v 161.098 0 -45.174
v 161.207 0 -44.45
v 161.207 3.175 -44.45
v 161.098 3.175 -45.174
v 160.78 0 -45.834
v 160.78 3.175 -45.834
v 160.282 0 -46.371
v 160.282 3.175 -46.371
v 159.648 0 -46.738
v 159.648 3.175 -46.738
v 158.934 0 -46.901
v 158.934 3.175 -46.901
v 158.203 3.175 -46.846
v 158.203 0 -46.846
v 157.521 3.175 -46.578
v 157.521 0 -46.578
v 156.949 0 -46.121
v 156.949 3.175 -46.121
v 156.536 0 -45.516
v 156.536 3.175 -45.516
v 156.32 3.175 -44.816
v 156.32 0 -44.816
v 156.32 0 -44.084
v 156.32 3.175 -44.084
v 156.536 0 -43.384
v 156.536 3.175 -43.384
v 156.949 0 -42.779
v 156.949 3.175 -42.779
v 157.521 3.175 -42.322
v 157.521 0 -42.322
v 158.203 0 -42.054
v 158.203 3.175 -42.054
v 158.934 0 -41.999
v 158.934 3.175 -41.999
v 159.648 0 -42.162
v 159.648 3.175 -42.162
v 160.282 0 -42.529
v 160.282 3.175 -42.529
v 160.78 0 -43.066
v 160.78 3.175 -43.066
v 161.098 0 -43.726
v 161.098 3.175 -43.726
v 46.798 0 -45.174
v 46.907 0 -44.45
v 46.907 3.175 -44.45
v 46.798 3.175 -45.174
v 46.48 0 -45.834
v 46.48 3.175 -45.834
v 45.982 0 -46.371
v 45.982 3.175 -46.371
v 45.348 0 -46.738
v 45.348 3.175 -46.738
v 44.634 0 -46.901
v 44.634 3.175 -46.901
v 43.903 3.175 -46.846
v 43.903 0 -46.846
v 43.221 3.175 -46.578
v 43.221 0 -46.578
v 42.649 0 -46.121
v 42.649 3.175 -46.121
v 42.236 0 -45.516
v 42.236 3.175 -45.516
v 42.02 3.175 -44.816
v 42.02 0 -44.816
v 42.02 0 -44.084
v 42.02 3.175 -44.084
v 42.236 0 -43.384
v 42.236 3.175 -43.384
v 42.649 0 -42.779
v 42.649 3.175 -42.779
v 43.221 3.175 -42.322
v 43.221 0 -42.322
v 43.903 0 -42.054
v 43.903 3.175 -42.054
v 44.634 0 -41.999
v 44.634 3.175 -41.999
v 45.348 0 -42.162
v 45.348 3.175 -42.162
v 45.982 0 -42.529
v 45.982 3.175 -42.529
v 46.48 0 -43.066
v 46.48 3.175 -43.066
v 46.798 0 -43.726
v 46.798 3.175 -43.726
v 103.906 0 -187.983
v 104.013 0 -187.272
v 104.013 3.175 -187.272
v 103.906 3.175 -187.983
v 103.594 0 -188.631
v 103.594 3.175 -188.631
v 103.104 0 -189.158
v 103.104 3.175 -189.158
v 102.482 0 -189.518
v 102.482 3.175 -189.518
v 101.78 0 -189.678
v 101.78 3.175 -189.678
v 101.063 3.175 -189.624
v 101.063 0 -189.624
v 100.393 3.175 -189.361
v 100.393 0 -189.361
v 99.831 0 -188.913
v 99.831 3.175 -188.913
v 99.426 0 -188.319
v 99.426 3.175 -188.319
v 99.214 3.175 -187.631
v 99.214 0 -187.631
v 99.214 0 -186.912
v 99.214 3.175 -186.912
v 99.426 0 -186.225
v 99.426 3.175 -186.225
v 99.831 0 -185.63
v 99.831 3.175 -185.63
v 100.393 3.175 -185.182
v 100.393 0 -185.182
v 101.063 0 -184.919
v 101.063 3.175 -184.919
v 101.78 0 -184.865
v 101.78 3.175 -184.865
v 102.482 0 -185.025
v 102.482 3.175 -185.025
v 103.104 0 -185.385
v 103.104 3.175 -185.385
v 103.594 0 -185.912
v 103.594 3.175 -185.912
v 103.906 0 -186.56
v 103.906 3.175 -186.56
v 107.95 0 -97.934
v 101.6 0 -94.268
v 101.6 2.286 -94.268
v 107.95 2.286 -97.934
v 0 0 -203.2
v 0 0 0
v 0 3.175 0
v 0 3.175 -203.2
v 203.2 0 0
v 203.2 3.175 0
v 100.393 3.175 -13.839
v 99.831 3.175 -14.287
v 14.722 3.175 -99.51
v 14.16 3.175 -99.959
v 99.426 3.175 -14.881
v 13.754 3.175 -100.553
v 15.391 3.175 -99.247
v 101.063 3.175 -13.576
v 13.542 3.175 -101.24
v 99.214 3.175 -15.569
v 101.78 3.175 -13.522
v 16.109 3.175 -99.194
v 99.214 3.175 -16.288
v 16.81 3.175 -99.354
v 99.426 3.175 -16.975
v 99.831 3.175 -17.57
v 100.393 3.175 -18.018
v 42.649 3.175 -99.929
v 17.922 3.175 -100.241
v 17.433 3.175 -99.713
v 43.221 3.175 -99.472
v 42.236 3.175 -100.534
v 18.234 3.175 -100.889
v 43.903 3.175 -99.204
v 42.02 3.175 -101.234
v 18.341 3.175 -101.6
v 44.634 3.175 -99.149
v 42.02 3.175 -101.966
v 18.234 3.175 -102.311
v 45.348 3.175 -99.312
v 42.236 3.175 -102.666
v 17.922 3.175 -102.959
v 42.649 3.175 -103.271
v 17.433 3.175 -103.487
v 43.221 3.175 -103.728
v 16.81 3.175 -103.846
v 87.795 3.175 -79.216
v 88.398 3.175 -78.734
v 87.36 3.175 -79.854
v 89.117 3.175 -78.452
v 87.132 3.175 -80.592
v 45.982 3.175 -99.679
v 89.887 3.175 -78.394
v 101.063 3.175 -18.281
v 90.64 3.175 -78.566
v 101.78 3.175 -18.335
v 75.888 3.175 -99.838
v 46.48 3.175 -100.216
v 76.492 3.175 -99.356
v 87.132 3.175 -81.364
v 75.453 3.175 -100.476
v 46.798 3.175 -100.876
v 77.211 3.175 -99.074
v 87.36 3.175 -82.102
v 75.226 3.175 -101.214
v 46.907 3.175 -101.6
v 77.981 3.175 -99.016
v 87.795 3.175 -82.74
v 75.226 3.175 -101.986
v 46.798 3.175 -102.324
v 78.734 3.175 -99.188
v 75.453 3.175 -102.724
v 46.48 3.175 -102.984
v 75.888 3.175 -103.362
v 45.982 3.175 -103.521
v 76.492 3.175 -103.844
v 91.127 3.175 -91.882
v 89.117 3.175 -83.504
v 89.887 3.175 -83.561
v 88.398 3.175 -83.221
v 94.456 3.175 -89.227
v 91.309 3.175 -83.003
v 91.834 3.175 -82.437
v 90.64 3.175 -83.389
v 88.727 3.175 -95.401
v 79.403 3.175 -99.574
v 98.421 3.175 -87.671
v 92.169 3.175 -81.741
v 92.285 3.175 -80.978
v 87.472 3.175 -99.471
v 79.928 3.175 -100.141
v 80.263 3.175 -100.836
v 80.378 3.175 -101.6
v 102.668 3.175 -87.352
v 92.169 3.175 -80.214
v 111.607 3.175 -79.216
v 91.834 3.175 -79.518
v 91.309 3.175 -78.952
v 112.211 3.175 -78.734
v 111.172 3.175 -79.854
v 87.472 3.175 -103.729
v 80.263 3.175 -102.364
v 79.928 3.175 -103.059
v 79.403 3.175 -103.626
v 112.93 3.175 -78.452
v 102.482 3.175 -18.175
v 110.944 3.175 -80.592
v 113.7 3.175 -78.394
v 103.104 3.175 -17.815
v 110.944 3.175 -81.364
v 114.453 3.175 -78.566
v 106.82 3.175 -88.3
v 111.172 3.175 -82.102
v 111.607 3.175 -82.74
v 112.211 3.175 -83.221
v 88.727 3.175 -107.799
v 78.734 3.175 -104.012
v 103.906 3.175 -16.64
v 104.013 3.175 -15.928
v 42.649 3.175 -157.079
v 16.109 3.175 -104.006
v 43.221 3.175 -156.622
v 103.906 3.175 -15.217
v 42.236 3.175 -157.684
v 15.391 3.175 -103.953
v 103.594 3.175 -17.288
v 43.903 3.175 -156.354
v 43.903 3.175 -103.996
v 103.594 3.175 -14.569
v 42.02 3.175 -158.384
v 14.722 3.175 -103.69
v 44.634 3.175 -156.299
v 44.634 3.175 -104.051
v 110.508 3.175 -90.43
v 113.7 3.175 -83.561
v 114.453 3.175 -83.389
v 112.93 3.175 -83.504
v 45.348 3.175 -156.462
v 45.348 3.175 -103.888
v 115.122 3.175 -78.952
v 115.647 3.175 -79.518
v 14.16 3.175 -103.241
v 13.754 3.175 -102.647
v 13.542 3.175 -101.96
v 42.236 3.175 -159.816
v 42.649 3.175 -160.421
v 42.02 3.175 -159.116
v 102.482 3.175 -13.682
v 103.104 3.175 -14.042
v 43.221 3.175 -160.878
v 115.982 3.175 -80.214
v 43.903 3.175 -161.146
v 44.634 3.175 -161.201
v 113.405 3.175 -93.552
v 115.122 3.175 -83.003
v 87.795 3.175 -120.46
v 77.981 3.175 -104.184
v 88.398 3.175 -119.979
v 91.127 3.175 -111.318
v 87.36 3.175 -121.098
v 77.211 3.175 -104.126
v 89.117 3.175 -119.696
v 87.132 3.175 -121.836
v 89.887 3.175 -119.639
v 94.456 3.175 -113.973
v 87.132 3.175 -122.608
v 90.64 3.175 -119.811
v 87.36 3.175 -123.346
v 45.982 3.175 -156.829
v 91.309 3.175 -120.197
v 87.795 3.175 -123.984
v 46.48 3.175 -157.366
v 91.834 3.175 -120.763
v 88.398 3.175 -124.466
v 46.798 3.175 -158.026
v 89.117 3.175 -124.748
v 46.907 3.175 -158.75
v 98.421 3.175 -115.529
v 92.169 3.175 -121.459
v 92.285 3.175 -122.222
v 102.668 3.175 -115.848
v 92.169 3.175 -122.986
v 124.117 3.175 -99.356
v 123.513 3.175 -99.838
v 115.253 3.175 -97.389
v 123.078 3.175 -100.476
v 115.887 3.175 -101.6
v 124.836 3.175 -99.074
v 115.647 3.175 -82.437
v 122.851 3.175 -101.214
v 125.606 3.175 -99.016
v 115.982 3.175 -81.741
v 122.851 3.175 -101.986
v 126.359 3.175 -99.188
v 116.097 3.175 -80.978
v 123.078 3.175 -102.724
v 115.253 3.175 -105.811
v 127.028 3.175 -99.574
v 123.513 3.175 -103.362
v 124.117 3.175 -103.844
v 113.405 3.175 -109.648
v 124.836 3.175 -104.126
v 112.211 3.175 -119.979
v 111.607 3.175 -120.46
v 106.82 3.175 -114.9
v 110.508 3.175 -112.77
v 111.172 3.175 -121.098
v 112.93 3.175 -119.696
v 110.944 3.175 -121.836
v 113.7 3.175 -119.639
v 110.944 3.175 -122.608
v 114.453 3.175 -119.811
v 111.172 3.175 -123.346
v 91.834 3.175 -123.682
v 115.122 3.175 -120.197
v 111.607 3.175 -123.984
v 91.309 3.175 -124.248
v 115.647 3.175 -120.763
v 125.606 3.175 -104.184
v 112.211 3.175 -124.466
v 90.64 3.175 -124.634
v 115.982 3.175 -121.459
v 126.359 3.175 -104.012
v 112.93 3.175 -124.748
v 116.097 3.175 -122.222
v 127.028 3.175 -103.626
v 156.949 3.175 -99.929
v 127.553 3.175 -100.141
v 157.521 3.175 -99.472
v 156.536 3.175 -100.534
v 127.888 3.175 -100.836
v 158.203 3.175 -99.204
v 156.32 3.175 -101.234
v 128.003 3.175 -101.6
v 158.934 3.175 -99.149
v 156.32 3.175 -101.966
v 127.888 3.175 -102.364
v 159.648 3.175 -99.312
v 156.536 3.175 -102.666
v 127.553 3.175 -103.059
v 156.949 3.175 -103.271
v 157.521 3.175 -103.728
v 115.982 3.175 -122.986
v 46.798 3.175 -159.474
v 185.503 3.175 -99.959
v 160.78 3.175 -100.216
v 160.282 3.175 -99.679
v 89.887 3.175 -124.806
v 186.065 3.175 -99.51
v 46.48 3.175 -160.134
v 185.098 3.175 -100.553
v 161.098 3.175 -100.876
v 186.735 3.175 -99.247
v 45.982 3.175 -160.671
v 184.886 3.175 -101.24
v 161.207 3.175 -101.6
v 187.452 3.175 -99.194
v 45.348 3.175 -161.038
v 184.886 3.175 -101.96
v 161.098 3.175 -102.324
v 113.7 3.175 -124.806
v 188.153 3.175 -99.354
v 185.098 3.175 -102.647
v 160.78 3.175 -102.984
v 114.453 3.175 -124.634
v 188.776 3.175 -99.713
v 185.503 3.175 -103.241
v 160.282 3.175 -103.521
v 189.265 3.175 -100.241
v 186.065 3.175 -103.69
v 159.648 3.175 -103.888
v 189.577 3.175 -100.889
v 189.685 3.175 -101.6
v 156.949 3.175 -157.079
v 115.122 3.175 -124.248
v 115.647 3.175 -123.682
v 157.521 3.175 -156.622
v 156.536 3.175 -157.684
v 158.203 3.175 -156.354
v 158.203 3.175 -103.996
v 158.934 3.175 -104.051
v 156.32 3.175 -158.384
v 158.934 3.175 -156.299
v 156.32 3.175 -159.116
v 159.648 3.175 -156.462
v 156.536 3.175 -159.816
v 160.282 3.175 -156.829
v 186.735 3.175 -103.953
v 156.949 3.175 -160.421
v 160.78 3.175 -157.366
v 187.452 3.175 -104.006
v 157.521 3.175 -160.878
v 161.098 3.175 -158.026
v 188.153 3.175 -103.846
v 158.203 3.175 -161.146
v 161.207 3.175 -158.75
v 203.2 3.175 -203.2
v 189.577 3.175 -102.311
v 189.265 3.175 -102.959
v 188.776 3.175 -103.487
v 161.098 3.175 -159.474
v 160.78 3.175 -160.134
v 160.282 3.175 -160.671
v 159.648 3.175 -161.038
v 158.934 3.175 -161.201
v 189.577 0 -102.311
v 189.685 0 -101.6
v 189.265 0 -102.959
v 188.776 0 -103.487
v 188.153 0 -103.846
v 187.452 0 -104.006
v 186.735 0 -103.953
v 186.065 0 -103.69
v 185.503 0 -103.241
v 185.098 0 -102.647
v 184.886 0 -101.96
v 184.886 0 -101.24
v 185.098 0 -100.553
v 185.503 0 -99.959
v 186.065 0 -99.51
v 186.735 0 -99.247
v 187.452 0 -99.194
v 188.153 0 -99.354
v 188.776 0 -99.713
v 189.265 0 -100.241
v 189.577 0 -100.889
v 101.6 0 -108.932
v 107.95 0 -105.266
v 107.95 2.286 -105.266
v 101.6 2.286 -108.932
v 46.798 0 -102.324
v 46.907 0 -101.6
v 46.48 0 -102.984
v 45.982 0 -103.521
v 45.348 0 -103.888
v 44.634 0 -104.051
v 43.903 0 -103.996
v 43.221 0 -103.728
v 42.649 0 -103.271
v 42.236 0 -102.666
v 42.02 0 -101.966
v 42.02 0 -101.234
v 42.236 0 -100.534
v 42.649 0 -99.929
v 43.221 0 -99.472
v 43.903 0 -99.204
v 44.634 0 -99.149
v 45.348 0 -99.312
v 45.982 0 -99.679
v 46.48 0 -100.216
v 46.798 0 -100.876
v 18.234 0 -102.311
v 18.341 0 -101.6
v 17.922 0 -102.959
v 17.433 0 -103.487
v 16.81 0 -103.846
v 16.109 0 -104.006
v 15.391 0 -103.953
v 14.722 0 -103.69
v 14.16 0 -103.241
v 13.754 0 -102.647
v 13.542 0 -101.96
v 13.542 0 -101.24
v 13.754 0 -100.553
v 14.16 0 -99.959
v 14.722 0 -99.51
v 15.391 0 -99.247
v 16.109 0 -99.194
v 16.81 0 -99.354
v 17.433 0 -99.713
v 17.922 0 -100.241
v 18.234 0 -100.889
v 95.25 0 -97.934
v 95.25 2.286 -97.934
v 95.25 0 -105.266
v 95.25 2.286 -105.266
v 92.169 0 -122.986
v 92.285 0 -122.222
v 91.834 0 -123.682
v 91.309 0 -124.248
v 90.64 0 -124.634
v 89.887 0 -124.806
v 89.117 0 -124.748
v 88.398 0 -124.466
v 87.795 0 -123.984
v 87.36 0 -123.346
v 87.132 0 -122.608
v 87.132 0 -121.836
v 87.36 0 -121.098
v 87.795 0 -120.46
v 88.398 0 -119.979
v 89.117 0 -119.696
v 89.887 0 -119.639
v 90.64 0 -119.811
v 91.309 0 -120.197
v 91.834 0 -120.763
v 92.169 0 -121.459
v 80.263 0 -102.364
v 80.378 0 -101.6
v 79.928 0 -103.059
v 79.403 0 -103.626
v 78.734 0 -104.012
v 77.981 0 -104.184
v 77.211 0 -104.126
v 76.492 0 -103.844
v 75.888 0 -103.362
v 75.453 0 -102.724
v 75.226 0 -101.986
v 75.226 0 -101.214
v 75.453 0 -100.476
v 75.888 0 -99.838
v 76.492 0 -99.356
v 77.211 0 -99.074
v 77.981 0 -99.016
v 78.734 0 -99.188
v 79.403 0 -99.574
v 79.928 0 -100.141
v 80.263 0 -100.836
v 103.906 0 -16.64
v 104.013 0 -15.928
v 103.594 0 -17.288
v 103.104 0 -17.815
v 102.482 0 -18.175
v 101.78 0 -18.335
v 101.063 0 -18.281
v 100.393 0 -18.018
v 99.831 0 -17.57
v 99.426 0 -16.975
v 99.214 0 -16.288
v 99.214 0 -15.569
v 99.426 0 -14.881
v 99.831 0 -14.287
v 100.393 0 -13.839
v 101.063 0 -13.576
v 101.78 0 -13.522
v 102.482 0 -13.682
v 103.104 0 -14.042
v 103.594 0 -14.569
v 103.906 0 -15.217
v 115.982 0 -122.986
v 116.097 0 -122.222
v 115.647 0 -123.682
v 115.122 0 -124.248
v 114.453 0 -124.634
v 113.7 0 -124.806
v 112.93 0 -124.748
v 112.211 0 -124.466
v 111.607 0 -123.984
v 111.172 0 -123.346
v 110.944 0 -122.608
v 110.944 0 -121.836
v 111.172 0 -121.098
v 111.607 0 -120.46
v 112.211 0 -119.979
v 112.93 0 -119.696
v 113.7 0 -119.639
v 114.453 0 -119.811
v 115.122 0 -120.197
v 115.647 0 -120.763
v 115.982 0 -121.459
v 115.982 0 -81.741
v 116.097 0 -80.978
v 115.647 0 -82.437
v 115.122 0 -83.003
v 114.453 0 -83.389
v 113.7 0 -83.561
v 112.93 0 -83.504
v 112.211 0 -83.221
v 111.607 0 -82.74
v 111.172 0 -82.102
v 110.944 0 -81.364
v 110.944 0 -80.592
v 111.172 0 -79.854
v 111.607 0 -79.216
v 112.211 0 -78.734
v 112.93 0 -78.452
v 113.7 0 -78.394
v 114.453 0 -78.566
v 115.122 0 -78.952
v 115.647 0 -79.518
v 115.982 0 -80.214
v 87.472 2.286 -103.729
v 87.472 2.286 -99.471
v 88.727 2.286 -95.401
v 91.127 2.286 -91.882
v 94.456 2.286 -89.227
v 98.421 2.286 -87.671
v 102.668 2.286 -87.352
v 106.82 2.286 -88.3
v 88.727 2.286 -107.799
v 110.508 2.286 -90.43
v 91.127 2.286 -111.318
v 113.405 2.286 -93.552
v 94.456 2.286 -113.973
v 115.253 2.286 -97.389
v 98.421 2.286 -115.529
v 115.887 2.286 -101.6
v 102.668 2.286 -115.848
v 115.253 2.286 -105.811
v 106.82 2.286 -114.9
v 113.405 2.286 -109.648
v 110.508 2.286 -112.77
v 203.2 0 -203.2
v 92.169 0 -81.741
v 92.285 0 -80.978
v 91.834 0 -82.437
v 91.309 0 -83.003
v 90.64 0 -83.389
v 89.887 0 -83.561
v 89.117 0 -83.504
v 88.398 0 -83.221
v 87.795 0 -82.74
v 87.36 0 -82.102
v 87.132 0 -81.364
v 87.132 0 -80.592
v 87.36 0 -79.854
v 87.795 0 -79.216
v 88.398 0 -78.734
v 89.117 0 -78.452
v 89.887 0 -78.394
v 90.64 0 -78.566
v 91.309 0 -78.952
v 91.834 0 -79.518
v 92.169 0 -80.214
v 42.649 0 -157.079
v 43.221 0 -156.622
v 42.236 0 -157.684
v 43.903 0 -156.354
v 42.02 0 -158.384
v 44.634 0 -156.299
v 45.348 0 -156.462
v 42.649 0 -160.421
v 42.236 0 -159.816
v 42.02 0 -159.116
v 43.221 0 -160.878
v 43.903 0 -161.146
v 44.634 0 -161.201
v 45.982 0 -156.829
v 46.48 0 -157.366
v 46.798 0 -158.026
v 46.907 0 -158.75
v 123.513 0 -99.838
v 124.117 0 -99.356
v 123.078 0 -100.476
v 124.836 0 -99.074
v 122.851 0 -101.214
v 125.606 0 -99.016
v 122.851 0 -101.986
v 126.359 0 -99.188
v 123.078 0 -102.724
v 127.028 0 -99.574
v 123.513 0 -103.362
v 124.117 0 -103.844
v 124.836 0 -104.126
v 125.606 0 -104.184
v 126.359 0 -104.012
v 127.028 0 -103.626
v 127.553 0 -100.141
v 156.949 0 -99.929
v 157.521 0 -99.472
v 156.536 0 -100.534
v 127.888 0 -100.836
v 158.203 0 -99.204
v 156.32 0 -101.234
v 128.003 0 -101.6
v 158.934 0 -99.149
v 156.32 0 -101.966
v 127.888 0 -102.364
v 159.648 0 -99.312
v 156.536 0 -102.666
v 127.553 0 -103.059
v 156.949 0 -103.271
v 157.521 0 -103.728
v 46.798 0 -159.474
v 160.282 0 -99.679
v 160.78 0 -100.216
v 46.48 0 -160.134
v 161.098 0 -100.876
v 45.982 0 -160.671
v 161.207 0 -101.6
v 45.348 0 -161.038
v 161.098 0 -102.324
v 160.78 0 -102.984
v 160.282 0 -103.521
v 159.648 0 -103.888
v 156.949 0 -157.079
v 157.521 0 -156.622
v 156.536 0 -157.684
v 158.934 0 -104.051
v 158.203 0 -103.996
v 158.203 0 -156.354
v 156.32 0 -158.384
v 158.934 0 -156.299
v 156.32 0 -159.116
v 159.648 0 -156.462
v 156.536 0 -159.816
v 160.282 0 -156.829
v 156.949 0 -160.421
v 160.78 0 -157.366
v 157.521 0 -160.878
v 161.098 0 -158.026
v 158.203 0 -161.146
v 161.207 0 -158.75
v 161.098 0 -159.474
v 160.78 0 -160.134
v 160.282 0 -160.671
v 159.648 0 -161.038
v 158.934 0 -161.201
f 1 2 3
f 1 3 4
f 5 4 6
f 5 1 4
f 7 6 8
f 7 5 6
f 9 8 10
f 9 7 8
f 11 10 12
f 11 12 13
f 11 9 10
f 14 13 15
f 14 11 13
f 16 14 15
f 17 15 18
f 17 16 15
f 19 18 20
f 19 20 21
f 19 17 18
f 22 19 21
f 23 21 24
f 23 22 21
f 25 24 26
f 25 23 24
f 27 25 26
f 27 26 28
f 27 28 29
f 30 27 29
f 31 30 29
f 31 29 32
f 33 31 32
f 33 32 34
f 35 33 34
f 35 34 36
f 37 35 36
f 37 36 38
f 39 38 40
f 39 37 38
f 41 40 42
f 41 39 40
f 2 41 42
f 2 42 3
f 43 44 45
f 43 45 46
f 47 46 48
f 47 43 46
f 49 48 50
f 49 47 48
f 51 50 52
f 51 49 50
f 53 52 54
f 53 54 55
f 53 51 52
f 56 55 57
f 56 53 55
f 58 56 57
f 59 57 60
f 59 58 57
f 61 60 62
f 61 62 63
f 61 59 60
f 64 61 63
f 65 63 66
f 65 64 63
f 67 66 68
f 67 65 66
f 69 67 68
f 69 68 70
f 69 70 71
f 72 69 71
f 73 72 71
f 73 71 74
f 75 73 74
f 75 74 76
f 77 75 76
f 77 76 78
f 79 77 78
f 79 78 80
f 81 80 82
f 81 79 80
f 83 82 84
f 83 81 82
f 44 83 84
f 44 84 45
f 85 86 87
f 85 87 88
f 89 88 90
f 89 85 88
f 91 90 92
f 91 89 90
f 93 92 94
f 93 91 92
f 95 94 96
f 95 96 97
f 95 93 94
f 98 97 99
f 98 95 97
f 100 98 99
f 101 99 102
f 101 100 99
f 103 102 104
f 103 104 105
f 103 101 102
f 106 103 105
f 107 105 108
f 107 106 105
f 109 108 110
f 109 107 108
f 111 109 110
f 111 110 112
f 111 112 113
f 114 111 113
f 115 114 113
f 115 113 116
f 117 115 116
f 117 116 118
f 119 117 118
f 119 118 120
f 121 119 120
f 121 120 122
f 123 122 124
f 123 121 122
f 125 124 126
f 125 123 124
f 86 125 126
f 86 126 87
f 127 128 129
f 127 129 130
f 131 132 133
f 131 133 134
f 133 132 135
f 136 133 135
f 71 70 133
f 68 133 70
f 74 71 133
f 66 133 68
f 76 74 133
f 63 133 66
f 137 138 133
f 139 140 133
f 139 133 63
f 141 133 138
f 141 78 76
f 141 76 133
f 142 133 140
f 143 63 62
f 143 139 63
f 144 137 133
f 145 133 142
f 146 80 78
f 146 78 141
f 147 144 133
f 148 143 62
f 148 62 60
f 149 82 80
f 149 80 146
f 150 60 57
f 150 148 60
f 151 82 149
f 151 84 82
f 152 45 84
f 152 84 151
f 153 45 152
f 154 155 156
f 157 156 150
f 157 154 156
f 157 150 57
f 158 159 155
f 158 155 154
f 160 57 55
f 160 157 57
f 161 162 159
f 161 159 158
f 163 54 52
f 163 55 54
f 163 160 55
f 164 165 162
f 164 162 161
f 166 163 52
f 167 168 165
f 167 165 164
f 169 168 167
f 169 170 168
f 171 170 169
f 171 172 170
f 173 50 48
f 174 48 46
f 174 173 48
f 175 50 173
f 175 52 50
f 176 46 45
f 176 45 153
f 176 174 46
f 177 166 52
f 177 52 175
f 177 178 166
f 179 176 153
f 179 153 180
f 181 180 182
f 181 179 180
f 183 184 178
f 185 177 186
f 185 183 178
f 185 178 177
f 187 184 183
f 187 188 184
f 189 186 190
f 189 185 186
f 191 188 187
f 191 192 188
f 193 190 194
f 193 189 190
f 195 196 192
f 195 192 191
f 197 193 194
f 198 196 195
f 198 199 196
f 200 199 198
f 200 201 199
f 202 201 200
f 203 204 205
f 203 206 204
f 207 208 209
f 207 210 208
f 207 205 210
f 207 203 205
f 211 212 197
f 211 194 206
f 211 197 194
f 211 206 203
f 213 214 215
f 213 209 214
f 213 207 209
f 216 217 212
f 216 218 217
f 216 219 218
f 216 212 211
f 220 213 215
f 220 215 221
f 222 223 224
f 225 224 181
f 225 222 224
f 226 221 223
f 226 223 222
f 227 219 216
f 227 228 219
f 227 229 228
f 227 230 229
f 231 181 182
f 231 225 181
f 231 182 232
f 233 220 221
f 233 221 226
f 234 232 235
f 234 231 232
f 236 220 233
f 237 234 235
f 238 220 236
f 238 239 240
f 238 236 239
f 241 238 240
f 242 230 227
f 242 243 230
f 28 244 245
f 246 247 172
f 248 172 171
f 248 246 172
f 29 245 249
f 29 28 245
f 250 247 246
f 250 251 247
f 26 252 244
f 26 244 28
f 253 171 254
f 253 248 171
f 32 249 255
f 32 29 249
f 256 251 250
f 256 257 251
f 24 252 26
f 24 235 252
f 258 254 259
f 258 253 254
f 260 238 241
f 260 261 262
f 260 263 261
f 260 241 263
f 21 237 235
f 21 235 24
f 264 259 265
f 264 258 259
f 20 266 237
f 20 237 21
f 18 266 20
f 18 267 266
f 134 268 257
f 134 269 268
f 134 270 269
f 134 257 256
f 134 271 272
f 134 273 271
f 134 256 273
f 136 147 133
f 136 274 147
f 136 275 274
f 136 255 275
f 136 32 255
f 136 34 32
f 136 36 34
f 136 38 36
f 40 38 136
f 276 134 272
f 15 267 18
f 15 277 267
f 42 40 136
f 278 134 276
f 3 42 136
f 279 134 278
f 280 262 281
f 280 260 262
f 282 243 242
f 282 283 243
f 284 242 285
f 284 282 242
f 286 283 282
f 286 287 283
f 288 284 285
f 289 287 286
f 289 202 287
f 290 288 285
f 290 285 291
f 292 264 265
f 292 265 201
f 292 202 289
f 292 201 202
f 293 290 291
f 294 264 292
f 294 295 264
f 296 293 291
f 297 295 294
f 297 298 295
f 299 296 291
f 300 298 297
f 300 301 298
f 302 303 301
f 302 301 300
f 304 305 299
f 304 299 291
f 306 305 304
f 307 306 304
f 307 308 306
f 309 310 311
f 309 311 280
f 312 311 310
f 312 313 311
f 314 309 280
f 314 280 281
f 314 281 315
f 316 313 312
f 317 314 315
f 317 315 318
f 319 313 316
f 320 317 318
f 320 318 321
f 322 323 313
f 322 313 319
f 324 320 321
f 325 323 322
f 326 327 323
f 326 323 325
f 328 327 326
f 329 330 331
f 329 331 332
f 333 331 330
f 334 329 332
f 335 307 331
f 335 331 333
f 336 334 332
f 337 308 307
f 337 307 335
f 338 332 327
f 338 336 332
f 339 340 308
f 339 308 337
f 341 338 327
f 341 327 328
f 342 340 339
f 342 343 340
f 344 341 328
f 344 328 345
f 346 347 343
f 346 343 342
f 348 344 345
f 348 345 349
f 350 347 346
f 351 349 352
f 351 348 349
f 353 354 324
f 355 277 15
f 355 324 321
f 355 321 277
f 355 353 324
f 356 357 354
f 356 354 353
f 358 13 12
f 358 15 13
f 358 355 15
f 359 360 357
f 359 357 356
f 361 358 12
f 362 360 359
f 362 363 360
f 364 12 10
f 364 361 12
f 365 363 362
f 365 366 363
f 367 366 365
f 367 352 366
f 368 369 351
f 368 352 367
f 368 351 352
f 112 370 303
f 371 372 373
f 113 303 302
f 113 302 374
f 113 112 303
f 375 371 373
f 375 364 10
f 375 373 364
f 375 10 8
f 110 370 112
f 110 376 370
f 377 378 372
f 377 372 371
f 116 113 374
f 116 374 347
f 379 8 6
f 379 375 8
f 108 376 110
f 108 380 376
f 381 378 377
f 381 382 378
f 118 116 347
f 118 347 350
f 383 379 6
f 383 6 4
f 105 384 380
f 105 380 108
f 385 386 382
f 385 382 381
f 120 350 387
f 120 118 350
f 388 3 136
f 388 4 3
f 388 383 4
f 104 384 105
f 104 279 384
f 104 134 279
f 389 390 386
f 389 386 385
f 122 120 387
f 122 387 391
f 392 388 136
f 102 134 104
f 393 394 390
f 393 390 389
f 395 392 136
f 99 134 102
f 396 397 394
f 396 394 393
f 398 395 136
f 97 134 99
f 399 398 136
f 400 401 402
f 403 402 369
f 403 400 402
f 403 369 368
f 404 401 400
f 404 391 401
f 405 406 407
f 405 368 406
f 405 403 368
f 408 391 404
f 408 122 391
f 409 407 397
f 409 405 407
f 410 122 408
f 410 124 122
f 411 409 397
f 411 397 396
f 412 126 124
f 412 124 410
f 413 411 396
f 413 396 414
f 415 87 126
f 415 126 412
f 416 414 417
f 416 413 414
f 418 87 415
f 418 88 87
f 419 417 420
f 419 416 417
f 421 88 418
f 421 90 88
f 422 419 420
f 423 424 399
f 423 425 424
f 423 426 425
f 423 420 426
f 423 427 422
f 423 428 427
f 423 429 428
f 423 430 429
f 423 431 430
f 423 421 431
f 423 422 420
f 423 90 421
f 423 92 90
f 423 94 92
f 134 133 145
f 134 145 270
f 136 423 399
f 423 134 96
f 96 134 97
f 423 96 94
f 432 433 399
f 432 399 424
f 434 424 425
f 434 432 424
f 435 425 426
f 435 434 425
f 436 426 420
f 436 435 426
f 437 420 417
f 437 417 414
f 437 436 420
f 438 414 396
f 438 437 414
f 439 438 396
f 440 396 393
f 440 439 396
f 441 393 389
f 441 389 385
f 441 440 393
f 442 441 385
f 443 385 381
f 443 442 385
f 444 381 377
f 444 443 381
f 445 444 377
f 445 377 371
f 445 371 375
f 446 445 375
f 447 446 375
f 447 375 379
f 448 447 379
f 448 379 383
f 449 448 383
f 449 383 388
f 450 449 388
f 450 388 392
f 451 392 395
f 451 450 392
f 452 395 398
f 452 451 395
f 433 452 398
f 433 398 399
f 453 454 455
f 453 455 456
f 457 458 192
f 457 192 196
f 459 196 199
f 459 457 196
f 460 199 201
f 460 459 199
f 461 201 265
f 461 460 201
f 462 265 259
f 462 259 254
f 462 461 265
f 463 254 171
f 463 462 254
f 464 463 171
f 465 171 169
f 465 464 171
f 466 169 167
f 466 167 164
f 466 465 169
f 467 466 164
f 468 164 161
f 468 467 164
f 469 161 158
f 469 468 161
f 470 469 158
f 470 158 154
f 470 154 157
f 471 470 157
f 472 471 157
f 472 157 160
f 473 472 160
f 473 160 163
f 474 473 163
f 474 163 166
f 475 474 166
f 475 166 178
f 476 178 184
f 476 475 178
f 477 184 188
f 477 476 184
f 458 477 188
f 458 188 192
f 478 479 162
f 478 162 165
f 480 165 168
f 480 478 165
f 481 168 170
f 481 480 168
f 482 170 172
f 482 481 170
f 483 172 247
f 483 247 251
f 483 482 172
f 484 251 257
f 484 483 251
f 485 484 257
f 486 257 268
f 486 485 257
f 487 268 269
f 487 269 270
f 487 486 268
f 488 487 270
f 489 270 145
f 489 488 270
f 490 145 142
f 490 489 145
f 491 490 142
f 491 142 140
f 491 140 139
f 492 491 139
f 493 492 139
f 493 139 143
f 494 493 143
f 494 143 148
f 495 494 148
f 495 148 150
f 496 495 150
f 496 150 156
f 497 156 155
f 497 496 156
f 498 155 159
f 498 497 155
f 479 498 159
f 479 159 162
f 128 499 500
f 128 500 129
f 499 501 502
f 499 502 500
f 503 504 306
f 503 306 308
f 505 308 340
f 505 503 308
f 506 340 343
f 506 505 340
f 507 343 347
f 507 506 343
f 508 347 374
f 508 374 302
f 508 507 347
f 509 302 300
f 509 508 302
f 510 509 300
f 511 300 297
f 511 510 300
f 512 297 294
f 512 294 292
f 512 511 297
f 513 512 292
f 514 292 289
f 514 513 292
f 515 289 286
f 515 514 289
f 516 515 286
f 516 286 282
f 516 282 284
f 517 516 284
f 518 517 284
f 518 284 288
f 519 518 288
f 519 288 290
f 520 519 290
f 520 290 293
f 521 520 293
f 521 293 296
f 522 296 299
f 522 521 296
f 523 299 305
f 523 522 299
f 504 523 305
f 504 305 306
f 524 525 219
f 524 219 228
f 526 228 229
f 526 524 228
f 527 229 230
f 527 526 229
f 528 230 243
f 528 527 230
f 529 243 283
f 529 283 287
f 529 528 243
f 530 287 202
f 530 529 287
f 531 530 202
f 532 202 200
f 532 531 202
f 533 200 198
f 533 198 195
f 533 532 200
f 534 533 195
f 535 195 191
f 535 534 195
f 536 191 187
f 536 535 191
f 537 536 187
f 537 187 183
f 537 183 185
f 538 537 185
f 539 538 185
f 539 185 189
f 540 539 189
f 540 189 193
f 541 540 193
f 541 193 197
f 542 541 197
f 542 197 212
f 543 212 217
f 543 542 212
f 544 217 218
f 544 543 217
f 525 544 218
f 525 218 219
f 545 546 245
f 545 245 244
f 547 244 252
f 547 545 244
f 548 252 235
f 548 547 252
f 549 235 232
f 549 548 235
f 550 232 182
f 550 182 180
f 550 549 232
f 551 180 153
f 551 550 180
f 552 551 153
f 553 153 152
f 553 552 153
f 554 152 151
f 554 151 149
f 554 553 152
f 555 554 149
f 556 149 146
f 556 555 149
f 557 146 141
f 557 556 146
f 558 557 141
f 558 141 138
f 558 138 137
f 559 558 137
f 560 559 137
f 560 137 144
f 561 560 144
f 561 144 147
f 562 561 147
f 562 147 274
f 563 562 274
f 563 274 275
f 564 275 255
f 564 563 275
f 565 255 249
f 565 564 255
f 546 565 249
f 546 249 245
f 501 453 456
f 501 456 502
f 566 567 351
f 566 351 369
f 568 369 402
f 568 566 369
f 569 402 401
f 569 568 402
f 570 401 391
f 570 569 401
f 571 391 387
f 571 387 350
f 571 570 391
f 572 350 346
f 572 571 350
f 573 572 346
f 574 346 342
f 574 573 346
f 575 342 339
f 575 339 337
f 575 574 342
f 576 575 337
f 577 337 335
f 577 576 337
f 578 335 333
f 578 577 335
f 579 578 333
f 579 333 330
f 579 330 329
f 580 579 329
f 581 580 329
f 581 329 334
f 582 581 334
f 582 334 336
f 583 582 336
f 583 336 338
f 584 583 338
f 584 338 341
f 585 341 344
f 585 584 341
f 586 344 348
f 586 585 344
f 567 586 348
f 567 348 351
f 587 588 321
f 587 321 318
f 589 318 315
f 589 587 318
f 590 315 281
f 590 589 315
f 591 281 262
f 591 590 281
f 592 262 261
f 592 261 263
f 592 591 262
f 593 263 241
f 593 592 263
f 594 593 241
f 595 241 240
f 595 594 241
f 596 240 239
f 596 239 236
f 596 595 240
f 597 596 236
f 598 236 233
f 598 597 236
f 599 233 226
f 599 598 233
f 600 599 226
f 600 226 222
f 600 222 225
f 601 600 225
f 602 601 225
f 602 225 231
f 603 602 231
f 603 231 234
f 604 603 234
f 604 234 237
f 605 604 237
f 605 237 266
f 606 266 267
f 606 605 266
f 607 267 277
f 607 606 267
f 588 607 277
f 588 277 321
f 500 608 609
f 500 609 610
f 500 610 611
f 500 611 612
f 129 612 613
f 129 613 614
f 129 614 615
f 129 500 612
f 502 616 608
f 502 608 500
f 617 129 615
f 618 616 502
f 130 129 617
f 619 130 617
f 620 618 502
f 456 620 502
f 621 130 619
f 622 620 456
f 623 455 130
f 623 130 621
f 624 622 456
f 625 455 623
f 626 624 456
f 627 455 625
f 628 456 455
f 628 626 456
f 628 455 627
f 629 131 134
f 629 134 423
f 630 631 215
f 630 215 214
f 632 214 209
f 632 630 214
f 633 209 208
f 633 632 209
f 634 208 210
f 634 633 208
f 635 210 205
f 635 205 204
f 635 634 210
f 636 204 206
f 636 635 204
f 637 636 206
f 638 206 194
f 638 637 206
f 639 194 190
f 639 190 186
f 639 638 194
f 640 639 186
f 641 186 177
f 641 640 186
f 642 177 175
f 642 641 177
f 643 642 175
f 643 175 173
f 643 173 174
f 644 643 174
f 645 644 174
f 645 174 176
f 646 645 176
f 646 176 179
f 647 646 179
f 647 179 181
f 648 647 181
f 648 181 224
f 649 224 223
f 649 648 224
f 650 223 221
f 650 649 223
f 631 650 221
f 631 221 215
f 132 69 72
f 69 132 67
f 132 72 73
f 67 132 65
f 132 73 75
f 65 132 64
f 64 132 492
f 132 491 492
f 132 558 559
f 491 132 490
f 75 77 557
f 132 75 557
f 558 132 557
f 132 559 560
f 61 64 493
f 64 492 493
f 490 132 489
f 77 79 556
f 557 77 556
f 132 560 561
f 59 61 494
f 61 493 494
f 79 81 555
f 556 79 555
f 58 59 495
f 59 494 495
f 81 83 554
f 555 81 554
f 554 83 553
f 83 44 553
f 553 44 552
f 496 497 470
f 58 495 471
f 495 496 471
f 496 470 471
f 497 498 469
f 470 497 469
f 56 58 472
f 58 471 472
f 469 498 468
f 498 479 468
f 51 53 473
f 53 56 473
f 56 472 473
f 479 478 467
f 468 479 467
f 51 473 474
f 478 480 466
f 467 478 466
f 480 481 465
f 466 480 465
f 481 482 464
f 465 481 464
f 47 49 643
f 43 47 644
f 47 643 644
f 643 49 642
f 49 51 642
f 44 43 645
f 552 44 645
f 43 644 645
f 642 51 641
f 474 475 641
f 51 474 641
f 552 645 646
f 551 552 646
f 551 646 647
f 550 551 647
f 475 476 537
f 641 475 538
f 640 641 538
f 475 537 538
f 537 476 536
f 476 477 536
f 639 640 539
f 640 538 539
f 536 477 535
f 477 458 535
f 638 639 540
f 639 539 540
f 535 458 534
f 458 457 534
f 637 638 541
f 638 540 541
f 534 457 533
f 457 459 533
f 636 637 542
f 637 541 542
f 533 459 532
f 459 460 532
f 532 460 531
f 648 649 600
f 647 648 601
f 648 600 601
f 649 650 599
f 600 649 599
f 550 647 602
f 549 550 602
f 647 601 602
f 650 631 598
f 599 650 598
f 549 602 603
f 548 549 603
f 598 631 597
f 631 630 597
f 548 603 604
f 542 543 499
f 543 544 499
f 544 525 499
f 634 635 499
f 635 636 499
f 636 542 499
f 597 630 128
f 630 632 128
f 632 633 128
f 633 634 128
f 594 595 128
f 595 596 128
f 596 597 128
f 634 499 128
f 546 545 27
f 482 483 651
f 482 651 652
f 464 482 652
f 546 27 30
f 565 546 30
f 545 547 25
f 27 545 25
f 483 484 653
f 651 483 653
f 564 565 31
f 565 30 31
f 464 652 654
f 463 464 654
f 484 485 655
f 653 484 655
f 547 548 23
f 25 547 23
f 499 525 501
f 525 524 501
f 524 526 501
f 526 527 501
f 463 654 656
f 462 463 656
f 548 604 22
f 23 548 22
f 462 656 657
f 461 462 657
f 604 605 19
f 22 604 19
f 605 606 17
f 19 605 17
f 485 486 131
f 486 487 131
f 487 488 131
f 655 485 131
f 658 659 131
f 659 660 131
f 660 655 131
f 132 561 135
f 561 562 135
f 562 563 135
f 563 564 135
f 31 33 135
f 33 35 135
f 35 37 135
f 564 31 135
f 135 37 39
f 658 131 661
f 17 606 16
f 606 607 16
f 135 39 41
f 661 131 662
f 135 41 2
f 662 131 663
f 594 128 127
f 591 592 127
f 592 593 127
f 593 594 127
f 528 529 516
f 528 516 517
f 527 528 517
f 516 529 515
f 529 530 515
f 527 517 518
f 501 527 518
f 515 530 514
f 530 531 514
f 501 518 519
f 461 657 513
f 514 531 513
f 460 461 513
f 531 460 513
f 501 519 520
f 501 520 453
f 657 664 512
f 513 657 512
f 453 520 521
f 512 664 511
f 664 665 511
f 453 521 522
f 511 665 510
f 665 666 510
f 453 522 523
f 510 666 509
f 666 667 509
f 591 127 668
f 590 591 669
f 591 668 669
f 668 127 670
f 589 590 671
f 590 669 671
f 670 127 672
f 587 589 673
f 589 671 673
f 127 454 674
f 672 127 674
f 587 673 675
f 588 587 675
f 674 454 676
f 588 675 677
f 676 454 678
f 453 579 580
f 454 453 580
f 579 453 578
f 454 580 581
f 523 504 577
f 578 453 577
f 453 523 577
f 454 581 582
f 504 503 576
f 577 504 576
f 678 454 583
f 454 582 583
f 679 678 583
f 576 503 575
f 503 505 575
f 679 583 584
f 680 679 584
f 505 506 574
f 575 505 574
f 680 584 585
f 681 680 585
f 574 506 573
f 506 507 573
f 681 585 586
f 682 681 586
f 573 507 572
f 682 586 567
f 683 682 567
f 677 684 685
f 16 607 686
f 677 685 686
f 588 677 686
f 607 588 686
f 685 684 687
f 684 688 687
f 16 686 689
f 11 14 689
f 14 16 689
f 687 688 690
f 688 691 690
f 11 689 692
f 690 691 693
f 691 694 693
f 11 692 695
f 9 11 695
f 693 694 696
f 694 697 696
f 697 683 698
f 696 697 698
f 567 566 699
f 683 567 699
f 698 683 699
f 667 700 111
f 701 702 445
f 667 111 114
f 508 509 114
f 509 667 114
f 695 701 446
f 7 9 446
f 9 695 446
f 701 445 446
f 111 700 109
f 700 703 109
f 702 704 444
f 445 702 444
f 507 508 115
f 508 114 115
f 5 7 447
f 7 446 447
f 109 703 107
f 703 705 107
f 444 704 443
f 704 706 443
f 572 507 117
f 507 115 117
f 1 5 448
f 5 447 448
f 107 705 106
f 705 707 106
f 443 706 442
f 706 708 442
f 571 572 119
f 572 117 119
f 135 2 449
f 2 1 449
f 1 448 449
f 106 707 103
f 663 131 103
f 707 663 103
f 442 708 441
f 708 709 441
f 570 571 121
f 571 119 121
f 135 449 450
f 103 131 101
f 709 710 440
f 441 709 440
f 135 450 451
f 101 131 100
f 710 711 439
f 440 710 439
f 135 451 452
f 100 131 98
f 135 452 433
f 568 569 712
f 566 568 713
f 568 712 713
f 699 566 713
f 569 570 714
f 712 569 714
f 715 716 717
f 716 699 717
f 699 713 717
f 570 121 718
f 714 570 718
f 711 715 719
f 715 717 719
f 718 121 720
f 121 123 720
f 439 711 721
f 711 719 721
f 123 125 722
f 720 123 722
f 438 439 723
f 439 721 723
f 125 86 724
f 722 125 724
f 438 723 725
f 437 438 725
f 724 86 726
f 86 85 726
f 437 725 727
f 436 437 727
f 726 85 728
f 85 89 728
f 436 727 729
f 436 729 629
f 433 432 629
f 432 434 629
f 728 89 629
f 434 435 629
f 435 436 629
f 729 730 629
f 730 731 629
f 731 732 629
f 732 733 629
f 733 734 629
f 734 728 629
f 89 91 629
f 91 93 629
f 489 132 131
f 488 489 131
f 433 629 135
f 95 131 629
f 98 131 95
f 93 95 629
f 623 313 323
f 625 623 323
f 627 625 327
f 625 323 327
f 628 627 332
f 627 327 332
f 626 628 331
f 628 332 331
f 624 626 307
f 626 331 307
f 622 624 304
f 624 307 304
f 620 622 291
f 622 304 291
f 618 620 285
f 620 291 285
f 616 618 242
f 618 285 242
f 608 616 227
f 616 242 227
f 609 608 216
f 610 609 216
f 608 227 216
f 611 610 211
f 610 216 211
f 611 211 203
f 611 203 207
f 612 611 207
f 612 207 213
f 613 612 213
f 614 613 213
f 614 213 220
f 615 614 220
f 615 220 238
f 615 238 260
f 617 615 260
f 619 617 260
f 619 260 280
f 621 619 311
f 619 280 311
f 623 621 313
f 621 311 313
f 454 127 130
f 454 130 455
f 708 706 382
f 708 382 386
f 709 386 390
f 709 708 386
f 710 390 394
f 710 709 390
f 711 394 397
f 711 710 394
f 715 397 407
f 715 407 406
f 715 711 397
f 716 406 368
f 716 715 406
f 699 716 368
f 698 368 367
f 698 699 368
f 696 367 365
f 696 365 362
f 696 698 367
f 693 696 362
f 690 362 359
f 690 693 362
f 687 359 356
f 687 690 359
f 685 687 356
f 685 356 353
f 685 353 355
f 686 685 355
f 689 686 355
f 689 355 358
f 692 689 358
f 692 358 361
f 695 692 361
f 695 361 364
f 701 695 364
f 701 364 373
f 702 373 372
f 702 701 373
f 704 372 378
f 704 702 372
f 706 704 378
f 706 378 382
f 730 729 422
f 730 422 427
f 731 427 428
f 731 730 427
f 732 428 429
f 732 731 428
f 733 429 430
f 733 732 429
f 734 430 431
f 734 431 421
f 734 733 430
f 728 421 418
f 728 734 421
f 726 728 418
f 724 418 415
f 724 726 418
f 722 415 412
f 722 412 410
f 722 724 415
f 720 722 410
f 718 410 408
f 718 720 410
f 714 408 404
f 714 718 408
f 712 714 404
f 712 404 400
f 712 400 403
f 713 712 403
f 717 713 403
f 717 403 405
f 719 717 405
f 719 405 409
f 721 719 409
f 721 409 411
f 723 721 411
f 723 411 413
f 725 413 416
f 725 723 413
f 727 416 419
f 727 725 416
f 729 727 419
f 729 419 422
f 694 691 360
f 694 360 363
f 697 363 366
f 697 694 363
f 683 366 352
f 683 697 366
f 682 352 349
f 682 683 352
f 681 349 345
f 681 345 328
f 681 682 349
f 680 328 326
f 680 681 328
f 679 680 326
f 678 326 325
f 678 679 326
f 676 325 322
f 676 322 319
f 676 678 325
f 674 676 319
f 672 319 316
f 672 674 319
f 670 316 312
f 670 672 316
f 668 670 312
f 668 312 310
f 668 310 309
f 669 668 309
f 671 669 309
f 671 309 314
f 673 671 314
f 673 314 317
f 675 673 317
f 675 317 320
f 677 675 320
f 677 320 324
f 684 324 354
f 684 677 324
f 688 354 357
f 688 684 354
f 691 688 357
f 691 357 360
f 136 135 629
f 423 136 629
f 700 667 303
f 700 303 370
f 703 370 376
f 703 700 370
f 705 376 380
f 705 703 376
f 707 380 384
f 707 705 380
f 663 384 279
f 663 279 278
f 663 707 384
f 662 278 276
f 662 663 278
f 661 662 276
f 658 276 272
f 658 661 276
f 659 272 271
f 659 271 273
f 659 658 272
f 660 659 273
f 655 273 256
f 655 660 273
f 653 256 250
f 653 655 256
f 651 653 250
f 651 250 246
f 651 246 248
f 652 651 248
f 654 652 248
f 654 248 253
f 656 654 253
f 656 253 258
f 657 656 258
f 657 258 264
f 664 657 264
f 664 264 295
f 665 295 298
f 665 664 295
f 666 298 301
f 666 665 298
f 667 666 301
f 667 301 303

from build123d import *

# Parameters (mm, degrees)
SKETCH1_W           = 203.2
SKETCH1_H           = 203.2
SKETCH1_R           = 2.45745
SKETCH1_R_2         = 2.5908
SKETCH1_R_3         = 2.413
BOSS_EXTRUDE1_DEPTH = 3.175
SKETCH2_R           = 14.2875
CUT_EXTRUDE1_DEPTH  = 0.889


with BuildPart() as part:
    # Sketch1 → Boss-Extrude1 (new body)
    with BuildSketch(Plane(origin=(0, 0, 0), x_dir=(1, 0, 0), z_dir=(0, 1, 0))):
        with Locations((101.6, 101.6)):
            Rectangle(SKETCH1_W, SKETCH1_H)
        with Locations((44.45, 158.75)):
            Circle(SKETCH1_R, mode=Mode.SUBTRACT)
        with Locations((44.45, 101.6)):
            Circle(SKETCH1_R, mode=Mode.SUBTRACT)
        with Locations((44.45, 44.45)):
            Circle(SKETCH1_R, mode=Mode.SUBTRACT)
        with Locations((158.75, 44.45)):
            Circle(SKETCH1_R, mode=Mode.SUBTRACT)
        with Locations((158.75, 101.6)):
            Circle(SKETCH1_R, mode=Mode.SUBTRACT)
        with Locations((158.75, 158.75)):
            Circle(SKETCH1_R, mode=Mode.SUBTRACT)
        with Locations((77.7875, 101.6)):
            Circle(SKETCH1_R_2, mode=Mode.SUBTRACT)
        with Locations((89.69375, 122.222229928)):
            Circle(SKETCH1_R_2, mode=Mode.SUBTRACT)
        with Locations((89.69375, 80.977770072)):
            Circle(SKETCH1_R_2, mode=Mode.SUBTRACT)
        with Locations((113.50625, 122.222229928)):
            Circle(SKETCH1_R_2, mode=Mode.SUBTRACT)
        with Locations((125.4125, 101.6)):
            Circle(SKETCH1_R_2, mode=Mode.SUBTRACT)
        with Locations((113.50625, 80.977770072)):
            Circle(SKETCH1_R_2, mode=Mode.SUBTRACT)
        with Locations((101.6, 187.271643395)):
            Circle(SKETCH1_R_3, mode=Mode.SUBTRACT)
        with Locations((187.271643395, 101.6)):
            Circle(SKETCH1_R_3, mode=Mode.SUBTRACT)
        with Locations((101.6, 15.928356605)):
            Circle(SKETCH1_R_3, mode=Mode.SUBTRACT)
        with Locations((15.928356605, 101.6)):
            Circle(SKETCH1_R_3, mode=Mode.SUBTRACT)
        Polygon((107.95, 105.266174209), (101.6, 108.932348419), (95.25, 105.266174209), (95.25, 97.933825791), (101.6, 94.267651581), (107.95, 97.933825791), align=None, mode=Mode.SUBTRACT)
    extrude(amount=BOSS_EXTRUDE1_DEPTH)

    # Sketch2 → Cut-Extrude1 (cut)
    with BuildSketch(Plane(origin=(0, 3.175, 0), x_dir=(1, 0, 0), z_dir=(0, 1, 0))):
        with Locations((101.6, 101.6)):
            Circle(SKETCH2_R)
    extrude(amount=-CUT_EXTRUDE1_DEPTH, mode=Mode.SUBTRACT)


solid = part.part
